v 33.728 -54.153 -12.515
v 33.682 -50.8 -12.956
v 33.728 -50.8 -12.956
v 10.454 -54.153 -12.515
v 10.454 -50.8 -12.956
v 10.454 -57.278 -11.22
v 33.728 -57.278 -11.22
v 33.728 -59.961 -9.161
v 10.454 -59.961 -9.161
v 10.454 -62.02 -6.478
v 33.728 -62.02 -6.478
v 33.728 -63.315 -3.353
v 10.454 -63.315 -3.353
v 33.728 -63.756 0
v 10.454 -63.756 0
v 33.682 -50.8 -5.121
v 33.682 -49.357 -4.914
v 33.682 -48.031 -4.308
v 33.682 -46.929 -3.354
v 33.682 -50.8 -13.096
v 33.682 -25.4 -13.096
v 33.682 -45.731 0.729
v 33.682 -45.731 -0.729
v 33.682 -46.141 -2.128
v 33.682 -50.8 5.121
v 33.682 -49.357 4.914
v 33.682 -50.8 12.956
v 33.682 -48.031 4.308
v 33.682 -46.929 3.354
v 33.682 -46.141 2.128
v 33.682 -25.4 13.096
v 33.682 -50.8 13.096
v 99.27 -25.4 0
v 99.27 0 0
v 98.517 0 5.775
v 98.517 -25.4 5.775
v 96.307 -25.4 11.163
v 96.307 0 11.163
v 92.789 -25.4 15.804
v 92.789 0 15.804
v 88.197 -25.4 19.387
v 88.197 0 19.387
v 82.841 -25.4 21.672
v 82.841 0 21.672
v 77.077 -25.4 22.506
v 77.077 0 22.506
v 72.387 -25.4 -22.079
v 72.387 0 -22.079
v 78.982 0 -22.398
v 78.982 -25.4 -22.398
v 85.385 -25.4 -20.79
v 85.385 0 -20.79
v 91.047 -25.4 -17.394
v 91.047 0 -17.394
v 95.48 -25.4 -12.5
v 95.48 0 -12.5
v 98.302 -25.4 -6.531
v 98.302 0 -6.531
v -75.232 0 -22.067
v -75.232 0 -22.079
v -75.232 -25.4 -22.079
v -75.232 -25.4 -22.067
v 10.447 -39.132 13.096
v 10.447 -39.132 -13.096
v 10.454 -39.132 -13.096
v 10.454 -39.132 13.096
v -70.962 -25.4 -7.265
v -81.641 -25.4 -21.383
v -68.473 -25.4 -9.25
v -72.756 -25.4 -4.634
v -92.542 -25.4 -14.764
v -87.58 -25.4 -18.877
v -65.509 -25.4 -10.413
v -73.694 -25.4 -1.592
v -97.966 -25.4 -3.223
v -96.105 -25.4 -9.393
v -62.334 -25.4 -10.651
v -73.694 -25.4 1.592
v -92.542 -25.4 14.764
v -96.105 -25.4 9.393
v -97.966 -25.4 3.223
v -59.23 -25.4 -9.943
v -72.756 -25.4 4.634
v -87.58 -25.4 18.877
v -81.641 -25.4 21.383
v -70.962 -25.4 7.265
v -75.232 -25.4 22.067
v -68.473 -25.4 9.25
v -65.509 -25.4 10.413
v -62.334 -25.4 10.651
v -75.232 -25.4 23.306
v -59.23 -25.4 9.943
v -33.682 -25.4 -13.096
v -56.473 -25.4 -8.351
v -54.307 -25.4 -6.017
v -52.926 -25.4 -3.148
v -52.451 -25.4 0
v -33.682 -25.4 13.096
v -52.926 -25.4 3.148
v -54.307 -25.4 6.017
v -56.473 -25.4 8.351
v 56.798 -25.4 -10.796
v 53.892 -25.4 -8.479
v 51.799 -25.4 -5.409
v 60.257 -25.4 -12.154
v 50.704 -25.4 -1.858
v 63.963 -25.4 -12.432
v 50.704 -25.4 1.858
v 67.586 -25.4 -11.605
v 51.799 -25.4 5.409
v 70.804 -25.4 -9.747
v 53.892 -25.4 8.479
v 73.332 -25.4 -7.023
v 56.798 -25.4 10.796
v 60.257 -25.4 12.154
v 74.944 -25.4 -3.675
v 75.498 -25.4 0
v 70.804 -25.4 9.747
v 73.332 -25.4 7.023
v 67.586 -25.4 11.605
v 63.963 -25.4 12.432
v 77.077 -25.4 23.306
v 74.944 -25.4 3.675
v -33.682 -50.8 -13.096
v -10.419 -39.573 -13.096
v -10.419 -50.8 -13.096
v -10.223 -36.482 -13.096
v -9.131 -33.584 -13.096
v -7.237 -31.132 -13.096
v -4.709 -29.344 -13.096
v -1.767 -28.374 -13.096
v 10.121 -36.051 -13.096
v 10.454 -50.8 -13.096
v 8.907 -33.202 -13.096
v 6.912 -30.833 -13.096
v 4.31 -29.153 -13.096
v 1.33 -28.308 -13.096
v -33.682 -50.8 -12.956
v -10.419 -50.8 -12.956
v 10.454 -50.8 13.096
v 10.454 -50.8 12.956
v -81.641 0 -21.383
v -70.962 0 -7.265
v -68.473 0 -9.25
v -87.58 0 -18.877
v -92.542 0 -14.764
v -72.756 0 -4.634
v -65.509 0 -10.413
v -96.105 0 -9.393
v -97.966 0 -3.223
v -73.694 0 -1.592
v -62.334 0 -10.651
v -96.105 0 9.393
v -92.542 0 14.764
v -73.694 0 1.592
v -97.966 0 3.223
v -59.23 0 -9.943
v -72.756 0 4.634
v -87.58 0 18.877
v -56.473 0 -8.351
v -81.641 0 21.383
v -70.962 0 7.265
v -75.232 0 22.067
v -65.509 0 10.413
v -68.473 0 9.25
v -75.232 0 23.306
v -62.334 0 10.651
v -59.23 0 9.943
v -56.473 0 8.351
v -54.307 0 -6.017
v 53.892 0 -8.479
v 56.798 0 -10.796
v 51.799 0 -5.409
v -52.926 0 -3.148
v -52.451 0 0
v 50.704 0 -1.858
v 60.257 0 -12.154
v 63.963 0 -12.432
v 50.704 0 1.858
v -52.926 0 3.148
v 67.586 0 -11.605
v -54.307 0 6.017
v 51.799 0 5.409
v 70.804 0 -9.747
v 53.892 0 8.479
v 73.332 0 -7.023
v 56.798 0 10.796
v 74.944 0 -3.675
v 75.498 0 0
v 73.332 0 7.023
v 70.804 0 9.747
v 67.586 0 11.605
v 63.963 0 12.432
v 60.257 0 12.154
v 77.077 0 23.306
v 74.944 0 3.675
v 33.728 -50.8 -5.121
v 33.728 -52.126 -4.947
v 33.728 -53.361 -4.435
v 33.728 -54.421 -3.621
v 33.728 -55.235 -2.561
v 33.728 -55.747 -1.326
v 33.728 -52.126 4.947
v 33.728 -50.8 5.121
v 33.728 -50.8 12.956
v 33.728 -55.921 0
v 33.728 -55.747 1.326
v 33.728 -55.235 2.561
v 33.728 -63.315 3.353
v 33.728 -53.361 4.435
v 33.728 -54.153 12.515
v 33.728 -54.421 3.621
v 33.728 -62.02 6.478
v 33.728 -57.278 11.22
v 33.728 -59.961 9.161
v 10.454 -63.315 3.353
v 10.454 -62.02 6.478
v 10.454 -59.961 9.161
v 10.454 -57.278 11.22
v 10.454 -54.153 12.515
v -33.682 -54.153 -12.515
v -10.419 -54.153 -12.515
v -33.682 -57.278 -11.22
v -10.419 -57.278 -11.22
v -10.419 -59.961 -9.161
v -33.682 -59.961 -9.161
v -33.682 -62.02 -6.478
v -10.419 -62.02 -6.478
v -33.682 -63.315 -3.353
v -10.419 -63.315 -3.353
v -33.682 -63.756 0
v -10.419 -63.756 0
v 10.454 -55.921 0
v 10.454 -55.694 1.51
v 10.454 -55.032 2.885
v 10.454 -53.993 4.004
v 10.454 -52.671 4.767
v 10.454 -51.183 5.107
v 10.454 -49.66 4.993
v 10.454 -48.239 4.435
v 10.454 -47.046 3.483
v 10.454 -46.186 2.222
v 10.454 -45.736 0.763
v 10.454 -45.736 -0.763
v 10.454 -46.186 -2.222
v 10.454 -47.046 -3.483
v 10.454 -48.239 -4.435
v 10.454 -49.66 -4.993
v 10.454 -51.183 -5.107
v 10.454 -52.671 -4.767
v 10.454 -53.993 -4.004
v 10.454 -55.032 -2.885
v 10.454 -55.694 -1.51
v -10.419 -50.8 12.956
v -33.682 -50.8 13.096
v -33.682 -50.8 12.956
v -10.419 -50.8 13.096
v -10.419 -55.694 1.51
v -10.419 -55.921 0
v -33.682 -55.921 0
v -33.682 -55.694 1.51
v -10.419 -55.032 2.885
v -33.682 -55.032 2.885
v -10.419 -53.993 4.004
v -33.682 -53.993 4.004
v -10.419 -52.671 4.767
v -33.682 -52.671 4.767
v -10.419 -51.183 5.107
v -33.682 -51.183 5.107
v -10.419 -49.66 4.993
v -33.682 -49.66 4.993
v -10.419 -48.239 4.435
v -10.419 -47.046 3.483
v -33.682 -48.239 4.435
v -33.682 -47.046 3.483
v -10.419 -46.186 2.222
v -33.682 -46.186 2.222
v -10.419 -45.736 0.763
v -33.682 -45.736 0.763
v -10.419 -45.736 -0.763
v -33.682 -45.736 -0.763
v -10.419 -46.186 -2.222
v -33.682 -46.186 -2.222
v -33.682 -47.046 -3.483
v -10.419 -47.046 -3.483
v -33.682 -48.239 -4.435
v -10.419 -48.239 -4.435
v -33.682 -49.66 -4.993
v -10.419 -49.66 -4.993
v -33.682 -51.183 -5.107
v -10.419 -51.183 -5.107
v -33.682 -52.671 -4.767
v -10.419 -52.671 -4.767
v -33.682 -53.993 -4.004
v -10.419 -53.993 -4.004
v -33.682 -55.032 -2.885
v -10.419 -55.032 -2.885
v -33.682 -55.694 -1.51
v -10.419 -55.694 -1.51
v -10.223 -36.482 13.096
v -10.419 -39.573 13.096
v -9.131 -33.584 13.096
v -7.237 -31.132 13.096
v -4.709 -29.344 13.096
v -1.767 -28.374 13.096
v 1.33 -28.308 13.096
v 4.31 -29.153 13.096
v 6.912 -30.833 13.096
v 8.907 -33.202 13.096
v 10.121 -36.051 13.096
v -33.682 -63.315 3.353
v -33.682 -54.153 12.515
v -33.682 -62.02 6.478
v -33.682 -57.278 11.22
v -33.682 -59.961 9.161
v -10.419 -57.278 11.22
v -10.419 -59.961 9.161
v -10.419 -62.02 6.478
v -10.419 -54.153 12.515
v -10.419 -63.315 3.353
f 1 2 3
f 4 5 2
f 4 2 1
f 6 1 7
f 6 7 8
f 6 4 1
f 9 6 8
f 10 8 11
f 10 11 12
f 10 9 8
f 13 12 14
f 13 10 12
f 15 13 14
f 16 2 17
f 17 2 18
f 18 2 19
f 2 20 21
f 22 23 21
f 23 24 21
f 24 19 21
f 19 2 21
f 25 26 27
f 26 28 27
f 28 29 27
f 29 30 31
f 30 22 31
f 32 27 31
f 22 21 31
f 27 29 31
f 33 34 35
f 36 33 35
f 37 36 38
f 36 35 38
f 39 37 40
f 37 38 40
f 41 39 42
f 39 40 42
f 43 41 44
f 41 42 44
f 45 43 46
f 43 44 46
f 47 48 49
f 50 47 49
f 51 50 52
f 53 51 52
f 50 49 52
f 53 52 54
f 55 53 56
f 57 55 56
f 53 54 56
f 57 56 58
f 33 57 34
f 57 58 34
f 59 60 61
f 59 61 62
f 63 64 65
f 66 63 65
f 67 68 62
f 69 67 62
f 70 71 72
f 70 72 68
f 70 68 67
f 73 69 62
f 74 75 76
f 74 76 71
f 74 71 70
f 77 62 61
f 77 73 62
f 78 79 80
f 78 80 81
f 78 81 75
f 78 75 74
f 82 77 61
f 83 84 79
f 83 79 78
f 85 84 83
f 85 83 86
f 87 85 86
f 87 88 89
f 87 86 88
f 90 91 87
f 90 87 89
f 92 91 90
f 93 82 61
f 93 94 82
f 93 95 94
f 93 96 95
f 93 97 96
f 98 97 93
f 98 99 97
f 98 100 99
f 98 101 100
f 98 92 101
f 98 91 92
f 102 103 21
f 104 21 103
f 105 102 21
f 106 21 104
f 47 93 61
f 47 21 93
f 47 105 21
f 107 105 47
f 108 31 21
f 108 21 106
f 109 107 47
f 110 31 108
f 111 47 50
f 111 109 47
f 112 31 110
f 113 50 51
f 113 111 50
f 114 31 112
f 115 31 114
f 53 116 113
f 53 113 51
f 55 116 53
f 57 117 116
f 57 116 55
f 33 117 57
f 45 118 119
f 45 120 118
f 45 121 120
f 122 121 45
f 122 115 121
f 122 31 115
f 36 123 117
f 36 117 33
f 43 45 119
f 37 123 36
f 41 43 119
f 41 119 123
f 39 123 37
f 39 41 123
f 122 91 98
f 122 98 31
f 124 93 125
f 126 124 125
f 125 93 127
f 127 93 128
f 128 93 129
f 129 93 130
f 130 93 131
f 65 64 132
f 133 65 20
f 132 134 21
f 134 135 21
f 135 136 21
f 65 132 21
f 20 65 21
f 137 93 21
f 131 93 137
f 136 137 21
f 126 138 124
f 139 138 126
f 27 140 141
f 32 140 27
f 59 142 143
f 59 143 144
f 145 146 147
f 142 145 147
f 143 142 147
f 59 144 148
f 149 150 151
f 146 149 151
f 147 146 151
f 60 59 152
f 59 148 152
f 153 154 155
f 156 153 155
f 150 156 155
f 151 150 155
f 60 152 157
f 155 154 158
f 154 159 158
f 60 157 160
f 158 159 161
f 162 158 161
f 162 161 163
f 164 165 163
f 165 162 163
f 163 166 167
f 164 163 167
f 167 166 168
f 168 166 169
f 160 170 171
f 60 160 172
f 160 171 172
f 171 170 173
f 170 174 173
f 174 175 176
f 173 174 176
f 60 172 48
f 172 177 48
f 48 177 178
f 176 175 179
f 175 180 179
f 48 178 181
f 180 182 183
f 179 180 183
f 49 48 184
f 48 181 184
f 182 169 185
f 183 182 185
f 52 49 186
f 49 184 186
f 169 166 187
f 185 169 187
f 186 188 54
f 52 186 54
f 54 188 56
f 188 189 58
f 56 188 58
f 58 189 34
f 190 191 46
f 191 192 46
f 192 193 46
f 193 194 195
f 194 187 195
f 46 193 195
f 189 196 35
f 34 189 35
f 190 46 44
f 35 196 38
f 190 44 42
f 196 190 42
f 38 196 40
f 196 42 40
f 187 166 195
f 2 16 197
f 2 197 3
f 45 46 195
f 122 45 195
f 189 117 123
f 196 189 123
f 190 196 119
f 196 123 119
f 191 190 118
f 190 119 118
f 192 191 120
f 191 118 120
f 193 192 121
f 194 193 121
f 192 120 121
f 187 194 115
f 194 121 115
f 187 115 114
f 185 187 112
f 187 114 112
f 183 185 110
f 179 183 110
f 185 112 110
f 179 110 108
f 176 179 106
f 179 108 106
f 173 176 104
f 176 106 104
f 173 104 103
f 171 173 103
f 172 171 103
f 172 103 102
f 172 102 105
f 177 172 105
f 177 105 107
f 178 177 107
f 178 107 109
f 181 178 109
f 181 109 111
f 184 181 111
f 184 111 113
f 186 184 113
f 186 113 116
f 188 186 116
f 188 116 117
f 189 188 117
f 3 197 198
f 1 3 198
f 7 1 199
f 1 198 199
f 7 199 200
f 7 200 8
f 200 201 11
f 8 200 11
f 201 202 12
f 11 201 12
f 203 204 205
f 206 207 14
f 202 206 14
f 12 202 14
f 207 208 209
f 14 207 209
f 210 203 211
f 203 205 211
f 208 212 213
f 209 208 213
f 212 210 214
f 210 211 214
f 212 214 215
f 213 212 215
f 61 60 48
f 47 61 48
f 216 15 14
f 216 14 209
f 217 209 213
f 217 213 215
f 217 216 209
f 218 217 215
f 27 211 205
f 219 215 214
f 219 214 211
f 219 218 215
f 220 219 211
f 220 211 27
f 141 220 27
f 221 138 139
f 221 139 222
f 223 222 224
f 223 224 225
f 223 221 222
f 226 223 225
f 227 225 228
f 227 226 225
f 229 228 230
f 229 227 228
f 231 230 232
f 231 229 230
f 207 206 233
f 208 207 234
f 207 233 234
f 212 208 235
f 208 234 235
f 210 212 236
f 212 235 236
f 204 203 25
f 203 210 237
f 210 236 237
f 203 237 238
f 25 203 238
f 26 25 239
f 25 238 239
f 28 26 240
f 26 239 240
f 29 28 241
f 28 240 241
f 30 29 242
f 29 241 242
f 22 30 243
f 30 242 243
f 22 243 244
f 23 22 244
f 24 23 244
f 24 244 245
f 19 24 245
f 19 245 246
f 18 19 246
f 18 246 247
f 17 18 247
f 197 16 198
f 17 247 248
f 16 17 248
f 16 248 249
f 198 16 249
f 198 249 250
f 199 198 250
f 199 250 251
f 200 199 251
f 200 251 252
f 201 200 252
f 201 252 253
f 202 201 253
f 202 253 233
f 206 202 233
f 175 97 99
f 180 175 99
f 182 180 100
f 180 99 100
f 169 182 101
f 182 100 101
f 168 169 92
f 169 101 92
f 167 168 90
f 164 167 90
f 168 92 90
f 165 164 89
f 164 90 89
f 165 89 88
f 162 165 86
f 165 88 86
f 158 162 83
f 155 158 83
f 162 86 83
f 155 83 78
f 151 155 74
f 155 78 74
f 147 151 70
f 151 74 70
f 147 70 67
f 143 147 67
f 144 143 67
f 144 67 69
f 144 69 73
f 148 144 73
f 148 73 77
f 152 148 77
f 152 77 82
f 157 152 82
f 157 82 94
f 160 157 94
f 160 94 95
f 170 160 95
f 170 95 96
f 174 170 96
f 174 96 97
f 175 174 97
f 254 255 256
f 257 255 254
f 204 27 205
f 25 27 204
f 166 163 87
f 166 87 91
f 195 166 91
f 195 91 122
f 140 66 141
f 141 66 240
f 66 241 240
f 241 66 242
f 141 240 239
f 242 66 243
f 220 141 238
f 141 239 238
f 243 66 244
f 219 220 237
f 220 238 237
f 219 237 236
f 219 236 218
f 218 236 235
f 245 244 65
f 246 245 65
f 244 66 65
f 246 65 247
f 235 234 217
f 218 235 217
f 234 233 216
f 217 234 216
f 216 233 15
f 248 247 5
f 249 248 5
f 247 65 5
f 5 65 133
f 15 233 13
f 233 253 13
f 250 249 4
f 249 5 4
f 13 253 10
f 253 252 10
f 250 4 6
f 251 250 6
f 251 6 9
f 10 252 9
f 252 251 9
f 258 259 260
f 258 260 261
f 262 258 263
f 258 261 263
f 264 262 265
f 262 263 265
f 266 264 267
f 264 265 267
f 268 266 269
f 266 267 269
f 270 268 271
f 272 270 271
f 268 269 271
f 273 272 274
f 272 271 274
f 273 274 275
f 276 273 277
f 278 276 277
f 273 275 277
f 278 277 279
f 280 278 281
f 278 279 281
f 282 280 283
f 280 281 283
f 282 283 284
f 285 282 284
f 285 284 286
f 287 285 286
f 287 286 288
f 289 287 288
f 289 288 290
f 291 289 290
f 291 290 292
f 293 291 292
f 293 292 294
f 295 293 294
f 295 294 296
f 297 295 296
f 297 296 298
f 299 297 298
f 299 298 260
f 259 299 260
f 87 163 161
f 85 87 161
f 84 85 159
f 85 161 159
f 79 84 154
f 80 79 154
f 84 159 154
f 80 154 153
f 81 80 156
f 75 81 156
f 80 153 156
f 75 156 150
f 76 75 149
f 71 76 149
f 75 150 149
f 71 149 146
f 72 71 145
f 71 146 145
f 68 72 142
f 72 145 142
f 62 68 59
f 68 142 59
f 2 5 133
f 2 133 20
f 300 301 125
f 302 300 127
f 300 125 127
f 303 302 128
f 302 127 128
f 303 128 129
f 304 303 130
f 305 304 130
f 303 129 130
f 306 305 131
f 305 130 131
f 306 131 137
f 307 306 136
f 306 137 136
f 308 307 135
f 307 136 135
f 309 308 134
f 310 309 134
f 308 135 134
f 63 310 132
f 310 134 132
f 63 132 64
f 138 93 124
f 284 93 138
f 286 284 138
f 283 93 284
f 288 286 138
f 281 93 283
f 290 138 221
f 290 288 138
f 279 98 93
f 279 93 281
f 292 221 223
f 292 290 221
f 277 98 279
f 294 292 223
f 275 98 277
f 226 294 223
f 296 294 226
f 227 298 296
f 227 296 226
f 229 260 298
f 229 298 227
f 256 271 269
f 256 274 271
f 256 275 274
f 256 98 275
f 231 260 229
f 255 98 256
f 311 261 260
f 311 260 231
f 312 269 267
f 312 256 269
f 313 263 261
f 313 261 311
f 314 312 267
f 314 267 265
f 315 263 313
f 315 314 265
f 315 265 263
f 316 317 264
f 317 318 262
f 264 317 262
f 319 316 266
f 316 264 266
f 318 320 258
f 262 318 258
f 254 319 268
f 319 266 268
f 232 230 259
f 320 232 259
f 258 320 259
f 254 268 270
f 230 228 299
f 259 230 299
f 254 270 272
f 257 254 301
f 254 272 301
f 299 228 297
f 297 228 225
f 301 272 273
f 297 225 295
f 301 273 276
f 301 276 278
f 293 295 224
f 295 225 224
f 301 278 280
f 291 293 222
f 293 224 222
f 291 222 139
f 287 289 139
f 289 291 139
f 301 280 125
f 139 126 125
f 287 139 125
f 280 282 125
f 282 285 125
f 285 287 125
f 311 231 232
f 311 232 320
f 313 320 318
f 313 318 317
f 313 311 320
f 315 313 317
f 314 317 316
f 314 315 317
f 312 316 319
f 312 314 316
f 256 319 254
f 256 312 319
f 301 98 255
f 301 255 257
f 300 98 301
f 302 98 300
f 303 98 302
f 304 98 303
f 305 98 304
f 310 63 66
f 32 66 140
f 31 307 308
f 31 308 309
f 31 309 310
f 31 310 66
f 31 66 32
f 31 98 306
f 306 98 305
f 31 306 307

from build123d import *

# Parameters (mm, degrees)
F13_W     = 152.3095369339
F13_H     = 45.384734869
F1_DEPTH  = 25.4
F2_DEPTH  = 25.4
F4_R      = 10.680963323
F5_DEPTH  = 25.401
F6_R      = 12.4666506347
F15_DEPTH = 25.401
F3_W      = 67.3640072346
F3_H      = 26.1916220188
F16_DEPTH = 25.4
F17_DEPTH = 67.4096792936
F8_R      = 10.4571880182
F10_DEPTH = 36.4030317793
F11_R     = 5.1214106797
F12_DEPTH = 132.9530260163


with BuildPart() as f1:
    # F13 (on Front) → F1 (new body)
    with BuildSketch(Plane.XZ):
        with Locations((0.9222924709, 0.6138533354)):
            Rectangle(F13_W, F13_H)
    extrude(amount=F1_DEPTH)

    # F14 (on face) + F0 (on face) → F2 (join)
    with BuildSketch(Plane.XZ):
        with BuildLine():
            Line((-75.232475996, -22.0671208814), (-75.232475996, 22.0671208814))
            ThreePointArc((-75.232475996, 22.0671208814), (-98.2022533394, 0), (-75.232475996, -22.0671208814))
        make_face()
    with BuildSketch(Plane.XZ):
        with BuildLine():
            ThreePointArc((72.386937855, -22.0785140991), (91.0472381253, -17.3936843382), (99.270022399, 0))
            ThreePointArc((99.270022399, 0), (92.7885691568, 15.8037323084), (77.0770609379, 22.5056499815))
            Line((77.0770609379, 22.5056499815), (77.0770609379, -22.0785140991))
            Line((77.0770609379, -22.0785140991), (72.386937855, -22.0785140991))
        make_face()
    extrude(amount=F2_DEPTH)

    # F4 (on face) → F5 (cut, through all)
    with BuildSketch(Plane.XZ.offset(25.4)):
        with Locations((-63.1323754787, 0)):
            Circle(F4_R)
    extrude(amount=-F5_DEPTH, mode=Mode.SUBTRACT)

    # F6 (on face) → F15 (cut, through all)
    with BuildSketch(Plane.XZ.offset(25.4)):
        with Locations((63.0310773849, 0)):
            Circle(F6_R)
    extrude(amount=-F15_DEPTH, mode=Mode.SUBTRACT)

    # F3 (on face) → F16 (join)
    with BuildSketch(Plane.XZ.offset(25.4)):
        Rectangle(F3_W, F3_H)
    extrude(amount=F16_DEPTH)

    # F7 (on face) → F17 (join)
    with BuildSketch(Plane(origin=(-33.6820036173, 0, 0), x_dir=(0, -1, 0), z_dir=(-1, 0, 0))):
        with BuildLine():
            ThreePointArc((50.8, -12.9561868231), (59.961407561, -9.161407561), (63.7561868231, 0))
            ThreePointArc((63.7561868231, 0), (59.961407561, 9.161407561), (50.8, 12.9561868231))
            Line((50.8, 12.9561868231), (50.8, -12.9561868231))
        make_face()
    extrude(amount=-F17_DEPTH)

    # F8 (on face) + F9 (on face) → F10 (cut, through all)
    with BuildSketch(Plane(origin=(0, 0, -13.0958110094), x_dir=(1, 0, 0), z_dir=(0, 0, -1))):
        with Locations((0, 38.6807024479)):
            Circle(F8_R)
    with BuildSketch(Plane(origin=(0, 0, -13.0958110094), x_dir=(1, 0, 0), z_dir=(0, 0, -1))):
        with BuildLine():
            ThreePointArc((-10.4190511629, 39.5729771324), (0.2211320485, 49.1355521295), (10.4474613547, 39.1316264868))
            Line((10.4474613547, 39.1316264868), (10.4537252337, 39.1316264868))
            Line((10.4537252337, 39.1316264868), (10.4537252337, 65.8641159534))
            Line((10.4537252337, 65.8641159534), (-10.4190511629, 65.8641159534))
            Line((-10.4190511629, 65.8641159534), (-10.4190511629, 39.5729771324))
        make_face()
    extrude(amount=-F10_DEPTH, mode=Mode.SUBTRACT)

    # F11 (on face) → F12 (cut, through all)
    with BuildSketch(Plane(origin=(-33.6820036173, 0, 0), x_dir=(0, -1, 0), z_dir=(-1, 0, 0))):
        with Locations((50.8, 0)):
            Circle(F11_R)
    extrude(amount=-F12_DEPTH, mode=Mode.SUBTRACT)


solid = f1.part
